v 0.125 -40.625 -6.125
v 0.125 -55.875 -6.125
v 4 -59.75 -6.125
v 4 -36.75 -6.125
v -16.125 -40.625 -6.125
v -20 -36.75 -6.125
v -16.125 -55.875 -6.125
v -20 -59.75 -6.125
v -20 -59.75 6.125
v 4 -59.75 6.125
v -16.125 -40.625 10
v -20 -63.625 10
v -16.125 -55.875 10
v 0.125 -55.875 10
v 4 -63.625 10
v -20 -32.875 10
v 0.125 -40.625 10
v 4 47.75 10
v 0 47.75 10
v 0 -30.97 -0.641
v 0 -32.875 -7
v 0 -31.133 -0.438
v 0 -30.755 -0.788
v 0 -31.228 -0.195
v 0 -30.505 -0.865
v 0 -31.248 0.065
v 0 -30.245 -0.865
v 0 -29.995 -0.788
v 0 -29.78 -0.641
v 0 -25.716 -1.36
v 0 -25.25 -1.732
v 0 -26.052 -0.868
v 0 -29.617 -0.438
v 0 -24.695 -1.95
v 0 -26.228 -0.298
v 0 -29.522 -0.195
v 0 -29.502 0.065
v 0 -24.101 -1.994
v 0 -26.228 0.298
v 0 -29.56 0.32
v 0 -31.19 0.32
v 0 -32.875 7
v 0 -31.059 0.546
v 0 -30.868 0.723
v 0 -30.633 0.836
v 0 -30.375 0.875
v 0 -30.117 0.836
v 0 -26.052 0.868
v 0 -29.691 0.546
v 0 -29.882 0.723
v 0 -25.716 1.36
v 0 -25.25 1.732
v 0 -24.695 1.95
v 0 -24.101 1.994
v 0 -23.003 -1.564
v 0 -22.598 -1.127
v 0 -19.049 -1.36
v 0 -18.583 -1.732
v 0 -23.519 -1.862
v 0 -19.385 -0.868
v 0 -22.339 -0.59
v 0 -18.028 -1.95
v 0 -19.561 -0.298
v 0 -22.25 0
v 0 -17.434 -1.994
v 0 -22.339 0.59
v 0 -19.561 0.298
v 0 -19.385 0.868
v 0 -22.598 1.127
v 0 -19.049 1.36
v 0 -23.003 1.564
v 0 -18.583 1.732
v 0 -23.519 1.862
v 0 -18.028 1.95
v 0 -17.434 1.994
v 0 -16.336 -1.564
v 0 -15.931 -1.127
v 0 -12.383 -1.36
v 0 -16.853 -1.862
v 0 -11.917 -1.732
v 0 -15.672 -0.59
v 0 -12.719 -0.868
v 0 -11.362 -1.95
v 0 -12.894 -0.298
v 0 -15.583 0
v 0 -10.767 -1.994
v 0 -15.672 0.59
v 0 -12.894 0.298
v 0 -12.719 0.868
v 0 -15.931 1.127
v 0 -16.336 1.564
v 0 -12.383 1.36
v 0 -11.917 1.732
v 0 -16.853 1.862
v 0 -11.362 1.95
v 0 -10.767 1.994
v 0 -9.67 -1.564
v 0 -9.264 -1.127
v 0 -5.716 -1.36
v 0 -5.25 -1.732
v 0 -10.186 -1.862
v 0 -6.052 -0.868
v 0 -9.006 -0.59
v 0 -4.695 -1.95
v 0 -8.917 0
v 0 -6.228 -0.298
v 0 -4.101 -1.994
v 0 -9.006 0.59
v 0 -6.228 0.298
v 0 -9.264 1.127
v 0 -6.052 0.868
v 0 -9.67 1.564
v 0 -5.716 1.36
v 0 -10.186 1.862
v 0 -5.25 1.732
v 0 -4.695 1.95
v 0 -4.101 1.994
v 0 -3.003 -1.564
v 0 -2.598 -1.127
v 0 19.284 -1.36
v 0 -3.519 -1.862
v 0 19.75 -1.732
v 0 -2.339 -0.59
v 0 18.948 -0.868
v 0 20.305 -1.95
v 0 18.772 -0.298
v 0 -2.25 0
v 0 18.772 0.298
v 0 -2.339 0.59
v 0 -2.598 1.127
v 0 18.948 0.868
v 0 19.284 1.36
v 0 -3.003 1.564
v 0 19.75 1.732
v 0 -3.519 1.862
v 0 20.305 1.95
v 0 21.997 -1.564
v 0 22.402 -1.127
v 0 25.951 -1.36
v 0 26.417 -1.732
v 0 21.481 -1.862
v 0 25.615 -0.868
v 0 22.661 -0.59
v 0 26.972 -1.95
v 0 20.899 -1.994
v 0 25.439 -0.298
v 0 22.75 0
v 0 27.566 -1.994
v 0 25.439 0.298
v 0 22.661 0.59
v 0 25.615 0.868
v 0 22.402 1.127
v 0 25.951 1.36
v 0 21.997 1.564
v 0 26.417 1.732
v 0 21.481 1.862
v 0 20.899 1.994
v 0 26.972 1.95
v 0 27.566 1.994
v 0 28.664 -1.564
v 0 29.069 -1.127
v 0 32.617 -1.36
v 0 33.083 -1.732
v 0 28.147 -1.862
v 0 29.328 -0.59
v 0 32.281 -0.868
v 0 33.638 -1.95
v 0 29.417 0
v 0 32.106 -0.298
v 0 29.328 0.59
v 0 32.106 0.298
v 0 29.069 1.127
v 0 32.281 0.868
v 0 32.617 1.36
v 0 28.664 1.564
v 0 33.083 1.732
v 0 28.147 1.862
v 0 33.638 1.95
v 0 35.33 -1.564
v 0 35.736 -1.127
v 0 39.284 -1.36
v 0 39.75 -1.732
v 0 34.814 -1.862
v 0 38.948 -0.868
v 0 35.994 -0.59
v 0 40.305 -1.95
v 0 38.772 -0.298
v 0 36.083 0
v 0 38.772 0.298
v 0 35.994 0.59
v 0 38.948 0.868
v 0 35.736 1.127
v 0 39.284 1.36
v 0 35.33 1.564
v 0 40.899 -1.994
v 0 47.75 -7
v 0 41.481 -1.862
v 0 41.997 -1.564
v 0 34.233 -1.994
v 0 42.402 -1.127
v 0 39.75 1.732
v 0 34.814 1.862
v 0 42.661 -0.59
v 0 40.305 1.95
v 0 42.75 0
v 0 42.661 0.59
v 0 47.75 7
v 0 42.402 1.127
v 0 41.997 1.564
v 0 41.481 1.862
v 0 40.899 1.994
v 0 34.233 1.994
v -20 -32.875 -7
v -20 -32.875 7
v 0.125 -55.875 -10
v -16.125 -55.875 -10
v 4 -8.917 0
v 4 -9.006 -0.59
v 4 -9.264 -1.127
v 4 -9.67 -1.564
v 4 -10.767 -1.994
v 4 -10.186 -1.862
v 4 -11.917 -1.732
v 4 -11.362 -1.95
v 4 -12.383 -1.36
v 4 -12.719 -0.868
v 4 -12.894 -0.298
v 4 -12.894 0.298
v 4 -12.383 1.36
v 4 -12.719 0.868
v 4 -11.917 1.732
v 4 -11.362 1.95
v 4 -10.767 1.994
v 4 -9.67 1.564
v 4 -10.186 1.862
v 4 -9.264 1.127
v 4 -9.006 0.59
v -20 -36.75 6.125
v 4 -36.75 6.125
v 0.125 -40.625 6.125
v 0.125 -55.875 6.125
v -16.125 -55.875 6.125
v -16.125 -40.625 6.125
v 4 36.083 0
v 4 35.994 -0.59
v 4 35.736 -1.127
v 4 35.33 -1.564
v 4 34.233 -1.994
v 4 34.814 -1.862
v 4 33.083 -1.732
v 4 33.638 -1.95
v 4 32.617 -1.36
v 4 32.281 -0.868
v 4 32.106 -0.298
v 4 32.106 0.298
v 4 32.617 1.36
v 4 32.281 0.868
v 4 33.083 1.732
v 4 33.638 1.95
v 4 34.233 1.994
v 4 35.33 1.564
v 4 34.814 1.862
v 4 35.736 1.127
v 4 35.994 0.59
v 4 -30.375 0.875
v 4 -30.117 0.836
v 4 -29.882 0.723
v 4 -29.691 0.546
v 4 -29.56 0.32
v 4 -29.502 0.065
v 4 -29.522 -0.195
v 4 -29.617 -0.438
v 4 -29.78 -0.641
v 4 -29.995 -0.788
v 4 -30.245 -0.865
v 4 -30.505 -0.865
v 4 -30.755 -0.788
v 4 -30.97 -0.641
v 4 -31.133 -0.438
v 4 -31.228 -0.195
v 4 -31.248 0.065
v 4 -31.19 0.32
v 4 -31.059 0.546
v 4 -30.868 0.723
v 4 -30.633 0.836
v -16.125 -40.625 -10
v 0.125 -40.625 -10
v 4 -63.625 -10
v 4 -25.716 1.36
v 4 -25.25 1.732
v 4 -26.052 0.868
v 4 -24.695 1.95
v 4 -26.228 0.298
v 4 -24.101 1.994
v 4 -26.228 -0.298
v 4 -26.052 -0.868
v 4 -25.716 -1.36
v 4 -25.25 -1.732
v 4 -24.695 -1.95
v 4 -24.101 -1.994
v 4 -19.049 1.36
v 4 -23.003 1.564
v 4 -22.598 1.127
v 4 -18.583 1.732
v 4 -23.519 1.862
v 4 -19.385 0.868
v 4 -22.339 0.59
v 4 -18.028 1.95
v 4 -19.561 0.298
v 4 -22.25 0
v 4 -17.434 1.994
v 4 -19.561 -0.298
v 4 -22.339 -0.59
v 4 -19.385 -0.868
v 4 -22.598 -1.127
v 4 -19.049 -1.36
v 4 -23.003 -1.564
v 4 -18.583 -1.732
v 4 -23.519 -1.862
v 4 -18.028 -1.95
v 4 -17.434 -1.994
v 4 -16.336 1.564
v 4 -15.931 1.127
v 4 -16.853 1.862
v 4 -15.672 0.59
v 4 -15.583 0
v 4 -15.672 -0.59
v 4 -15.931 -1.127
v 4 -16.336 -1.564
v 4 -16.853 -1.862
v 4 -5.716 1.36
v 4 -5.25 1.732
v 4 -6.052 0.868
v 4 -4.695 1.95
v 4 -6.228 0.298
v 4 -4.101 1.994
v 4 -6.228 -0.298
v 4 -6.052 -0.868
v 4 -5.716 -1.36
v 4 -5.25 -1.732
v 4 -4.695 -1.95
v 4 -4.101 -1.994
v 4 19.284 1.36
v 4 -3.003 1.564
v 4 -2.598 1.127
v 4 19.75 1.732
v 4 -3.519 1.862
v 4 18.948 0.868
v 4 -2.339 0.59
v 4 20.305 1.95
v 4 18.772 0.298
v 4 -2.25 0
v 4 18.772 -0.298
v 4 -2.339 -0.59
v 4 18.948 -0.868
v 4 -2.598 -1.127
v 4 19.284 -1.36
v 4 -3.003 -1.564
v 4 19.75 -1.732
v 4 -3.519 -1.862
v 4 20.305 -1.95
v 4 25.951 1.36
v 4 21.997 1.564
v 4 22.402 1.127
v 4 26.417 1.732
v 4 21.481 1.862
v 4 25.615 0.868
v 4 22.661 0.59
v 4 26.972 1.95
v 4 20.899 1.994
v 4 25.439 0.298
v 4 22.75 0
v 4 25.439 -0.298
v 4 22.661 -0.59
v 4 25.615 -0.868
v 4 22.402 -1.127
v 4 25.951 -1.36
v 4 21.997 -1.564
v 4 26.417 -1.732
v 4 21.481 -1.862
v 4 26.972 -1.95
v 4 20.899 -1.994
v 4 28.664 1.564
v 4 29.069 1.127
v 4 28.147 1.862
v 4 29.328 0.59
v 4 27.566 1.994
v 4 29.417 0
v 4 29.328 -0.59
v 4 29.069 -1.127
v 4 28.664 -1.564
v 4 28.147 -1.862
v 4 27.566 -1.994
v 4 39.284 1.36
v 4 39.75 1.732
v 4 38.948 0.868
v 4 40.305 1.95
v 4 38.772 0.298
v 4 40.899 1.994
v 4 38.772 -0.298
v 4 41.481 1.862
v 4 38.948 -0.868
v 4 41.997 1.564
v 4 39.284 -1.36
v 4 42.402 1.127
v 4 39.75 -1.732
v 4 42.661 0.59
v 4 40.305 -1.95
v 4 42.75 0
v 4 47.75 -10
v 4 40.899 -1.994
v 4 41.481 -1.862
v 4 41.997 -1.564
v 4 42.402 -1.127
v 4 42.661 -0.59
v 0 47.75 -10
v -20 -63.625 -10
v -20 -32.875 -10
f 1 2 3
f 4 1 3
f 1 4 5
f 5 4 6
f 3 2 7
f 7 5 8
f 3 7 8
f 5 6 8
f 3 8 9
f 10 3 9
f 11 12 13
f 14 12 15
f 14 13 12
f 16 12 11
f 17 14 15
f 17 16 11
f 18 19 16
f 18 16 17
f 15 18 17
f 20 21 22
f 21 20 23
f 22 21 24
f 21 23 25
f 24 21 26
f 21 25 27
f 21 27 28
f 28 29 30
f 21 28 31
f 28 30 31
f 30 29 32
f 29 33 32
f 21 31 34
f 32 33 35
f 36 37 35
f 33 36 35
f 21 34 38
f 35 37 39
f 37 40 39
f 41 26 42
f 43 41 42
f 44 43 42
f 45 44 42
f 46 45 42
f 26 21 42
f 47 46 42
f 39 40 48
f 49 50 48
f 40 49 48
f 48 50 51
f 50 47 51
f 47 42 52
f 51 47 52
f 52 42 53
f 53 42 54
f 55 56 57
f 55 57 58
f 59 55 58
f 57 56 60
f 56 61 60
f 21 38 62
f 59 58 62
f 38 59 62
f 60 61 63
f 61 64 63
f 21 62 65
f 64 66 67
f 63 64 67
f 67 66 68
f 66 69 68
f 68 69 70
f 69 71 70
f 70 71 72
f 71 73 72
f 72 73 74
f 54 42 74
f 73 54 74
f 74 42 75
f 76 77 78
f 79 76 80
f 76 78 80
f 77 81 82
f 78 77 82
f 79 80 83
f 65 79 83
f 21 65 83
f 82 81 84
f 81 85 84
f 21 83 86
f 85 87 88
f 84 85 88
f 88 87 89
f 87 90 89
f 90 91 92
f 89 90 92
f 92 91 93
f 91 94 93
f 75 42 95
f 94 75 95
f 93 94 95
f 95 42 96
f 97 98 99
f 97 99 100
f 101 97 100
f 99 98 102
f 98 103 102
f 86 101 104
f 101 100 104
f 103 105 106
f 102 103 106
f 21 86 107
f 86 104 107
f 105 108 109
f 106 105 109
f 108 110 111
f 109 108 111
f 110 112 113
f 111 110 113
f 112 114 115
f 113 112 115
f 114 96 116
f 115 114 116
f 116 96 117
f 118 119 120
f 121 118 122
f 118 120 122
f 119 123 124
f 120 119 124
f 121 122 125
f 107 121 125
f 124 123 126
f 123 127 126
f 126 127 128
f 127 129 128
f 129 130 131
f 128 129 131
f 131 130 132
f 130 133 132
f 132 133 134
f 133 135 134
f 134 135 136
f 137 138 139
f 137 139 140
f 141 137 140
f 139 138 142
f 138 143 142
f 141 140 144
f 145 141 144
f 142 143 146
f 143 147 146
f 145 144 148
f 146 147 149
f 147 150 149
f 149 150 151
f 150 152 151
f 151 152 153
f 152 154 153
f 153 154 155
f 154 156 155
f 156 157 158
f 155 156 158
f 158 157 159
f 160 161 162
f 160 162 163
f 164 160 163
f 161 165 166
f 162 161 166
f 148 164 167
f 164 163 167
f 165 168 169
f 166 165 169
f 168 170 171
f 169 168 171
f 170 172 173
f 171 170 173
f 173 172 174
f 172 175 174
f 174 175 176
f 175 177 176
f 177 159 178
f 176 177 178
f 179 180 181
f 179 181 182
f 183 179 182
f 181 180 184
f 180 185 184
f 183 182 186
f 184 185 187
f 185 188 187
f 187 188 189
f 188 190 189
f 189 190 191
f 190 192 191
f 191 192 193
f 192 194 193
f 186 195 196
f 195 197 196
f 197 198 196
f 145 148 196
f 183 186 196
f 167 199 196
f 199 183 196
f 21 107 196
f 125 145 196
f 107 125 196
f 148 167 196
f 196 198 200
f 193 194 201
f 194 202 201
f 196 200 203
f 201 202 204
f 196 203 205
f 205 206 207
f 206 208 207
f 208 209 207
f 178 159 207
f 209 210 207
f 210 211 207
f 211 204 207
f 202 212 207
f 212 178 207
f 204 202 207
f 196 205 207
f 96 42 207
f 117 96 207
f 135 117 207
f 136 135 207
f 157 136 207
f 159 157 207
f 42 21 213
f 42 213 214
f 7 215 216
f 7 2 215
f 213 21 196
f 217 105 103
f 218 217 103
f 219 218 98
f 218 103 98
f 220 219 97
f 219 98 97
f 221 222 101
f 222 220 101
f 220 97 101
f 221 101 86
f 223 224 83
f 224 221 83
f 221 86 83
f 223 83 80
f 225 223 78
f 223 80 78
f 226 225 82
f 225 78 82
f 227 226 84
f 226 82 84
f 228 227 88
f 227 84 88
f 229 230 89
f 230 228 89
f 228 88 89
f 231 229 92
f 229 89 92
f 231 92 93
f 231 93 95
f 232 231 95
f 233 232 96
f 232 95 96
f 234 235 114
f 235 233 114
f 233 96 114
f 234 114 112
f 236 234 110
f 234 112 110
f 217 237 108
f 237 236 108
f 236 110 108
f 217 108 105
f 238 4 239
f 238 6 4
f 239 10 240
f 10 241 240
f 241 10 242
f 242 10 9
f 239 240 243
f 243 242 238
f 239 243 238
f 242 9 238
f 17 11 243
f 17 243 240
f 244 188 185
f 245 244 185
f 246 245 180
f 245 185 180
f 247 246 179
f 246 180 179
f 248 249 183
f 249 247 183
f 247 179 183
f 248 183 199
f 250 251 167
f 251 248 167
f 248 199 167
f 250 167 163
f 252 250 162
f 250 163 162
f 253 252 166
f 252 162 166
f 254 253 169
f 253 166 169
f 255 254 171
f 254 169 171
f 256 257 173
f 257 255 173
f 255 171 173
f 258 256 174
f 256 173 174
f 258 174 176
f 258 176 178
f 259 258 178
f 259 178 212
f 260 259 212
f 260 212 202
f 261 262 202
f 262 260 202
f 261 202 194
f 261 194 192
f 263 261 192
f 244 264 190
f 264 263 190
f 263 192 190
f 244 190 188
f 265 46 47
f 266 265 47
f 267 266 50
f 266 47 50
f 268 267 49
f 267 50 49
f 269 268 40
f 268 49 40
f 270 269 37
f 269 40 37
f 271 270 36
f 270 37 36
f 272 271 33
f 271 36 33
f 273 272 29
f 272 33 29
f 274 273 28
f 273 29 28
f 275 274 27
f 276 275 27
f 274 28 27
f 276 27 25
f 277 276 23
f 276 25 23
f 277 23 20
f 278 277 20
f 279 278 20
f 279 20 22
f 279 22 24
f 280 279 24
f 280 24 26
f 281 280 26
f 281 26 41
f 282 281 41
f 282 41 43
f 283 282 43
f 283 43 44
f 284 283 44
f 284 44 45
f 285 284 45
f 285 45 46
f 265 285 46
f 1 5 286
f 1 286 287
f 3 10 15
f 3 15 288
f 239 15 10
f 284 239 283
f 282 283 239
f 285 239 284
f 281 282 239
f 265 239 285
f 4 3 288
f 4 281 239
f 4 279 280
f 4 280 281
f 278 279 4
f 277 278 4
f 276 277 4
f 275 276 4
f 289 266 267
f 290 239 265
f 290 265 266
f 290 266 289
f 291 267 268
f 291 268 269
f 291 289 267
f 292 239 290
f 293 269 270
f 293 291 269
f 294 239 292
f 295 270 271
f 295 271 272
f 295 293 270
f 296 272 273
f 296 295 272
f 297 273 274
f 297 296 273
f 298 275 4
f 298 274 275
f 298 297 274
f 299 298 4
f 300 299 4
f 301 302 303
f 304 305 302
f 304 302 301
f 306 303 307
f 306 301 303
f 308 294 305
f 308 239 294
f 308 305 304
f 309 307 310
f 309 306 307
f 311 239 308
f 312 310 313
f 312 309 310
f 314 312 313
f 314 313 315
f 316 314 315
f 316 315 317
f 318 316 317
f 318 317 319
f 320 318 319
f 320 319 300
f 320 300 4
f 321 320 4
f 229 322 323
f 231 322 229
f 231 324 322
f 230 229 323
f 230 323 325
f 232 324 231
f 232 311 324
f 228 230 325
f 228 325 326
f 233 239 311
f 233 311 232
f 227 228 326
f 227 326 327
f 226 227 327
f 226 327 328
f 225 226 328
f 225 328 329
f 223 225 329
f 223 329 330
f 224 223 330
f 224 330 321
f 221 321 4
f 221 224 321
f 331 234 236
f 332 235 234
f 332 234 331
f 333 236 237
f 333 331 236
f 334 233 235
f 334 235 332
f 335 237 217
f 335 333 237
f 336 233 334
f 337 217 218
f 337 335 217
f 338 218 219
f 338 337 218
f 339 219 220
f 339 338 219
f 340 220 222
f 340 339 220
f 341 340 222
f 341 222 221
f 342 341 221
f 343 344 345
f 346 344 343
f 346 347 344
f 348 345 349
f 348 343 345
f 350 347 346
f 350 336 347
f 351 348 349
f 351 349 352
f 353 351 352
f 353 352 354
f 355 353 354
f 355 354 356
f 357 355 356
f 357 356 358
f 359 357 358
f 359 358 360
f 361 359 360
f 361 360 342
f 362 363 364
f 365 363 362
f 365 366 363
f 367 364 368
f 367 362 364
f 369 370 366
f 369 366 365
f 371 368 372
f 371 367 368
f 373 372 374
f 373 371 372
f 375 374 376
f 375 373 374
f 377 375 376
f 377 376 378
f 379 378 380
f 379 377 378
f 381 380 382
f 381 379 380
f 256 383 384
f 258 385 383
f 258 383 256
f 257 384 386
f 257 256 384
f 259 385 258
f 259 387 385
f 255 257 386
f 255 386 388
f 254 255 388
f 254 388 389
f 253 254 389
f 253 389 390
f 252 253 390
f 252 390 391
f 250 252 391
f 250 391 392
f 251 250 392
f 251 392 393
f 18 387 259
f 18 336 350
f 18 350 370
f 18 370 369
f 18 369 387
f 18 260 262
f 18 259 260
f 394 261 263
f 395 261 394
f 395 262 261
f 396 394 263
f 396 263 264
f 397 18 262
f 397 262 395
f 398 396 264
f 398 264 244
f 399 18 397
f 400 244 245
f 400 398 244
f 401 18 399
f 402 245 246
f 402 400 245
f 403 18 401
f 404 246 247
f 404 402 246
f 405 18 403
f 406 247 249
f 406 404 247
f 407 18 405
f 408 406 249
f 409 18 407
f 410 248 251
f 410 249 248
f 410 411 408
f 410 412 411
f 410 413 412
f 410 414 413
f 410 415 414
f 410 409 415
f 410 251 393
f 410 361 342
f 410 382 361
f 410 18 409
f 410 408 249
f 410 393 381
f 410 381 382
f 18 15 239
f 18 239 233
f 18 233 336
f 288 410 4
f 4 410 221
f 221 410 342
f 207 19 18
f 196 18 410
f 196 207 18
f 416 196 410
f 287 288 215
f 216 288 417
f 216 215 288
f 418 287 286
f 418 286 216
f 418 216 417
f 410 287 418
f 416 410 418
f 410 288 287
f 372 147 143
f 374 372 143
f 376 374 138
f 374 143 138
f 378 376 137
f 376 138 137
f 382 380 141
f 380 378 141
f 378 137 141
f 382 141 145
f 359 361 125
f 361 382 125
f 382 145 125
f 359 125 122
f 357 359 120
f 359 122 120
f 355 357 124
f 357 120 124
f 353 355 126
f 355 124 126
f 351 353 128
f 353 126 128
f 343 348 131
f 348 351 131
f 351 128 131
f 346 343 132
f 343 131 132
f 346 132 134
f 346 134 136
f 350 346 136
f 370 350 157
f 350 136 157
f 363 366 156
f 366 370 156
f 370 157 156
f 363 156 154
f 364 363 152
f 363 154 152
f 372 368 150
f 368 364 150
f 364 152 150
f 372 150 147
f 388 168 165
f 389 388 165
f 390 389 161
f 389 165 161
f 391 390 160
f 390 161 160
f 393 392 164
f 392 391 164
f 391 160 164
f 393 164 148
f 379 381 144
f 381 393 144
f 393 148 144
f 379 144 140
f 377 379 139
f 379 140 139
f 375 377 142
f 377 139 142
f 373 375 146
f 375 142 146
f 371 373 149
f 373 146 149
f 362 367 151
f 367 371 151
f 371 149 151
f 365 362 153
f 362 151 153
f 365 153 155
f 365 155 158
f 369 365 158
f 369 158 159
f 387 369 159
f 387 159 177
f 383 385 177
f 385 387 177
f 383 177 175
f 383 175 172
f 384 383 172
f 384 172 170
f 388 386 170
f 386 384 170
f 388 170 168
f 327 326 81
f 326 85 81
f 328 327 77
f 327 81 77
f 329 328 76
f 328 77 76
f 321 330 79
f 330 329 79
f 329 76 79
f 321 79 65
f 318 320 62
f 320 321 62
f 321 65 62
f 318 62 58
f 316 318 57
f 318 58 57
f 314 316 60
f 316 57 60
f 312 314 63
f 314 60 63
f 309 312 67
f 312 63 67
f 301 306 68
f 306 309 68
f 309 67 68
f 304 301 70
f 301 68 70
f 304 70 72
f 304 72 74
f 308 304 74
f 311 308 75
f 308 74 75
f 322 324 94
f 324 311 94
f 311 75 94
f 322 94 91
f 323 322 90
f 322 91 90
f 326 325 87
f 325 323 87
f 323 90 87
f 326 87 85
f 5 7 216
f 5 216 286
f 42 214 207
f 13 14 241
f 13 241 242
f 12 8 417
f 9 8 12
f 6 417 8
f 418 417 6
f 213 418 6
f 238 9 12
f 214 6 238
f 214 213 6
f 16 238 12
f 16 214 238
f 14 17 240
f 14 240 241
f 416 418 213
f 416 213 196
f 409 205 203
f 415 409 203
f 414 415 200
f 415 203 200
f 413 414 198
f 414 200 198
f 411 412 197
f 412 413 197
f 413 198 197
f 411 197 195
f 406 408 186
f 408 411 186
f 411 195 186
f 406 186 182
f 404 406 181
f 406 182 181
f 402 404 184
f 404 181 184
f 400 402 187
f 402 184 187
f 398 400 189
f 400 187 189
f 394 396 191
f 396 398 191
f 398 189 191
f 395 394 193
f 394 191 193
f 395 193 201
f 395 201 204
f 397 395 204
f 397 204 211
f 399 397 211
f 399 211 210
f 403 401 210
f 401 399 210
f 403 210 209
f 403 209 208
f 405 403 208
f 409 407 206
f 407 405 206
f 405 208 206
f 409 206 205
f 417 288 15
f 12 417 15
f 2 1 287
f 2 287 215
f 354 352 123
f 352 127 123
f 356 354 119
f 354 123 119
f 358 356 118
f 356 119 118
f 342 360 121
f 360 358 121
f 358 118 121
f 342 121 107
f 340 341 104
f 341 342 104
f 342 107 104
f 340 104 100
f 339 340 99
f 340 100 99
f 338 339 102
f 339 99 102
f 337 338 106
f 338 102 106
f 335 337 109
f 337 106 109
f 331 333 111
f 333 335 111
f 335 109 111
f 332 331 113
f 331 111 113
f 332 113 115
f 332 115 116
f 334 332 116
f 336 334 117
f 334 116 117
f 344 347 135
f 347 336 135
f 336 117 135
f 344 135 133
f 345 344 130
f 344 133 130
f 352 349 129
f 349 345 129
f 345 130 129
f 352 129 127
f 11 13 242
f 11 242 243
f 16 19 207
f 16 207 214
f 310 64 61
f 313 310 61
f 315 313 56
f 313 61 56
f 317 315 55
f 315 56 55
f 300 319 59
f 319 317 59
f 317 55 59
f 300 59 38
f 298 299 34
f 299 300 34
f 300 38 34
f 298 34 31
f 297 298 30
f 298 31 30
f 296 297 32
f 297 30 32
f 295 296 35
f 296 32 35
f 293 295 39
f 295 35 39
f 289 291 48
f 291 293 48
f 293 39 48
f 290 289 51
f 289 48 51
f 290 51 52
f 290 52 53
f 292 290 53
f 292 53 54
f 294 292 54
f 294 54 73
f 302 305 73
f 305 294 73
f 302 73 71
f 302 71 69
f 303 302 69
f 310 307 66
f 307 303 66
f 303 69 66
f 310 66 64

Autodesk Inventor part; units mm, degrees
ref_plane "YZ Plane" through (0, 0, 0) normal (1, 0, 0) x (0, 1, 0)
ref_plane "XZ Plane" through (0, 0, 0) normal (0, 1, 0) x (-1, 0, 0)
ref_plane "XY Plane" through (0, 0, 0) normal (0, 0, 1) x (1, 0, 0)
sketch "Sketch1" plane through (0, 0, 0) normal (1, 0, 0) x (0, 1, 0)
  line L0 (47.75, -10) -> (-47.75, -10)
  line L1 (-47.75, -10) -> (-47.75, 10)
  line L2 (-47.75, 10) -> (47.75, 10)
  line L3 (47.75, 10) -> (47.75, -10)
  line L4 (47.75, -10) -> (-47.75, 10) construction
  line L5 (-47.75, -10) -> (47.75, 10) construction
  circle A0 centre (40.75, 0) radius 2
  circle A1 centre (-4.25, 0) radius 2
  line L6 (18.25, 25.1028) -> (18.25, -34.7635) construction
  line L7 (-1.75, 23.8417) -> (-1.75, -36.7999) construction
  circle A2 centre (20.75, 0) radius 2
  circle A3 centre (-24.25, 0) radius 2
  line L8 (-41.75, 23.8417) -> (-41.75, -30.9921) construction
  circle A4 centre (34.0833, 0) radius 2
  circle A5 centre (27.4167, 0) radius 2
  circle A6 centre (-10.9167, 0) radius 2
  circle A7 centre (-17.5833, 0) radius 2
  point P0 (0, 0)
  dimension "d1" = 20
  dimension "d4" = 4
  dimension "d5" = 7
  dimension "d6" = 45
  dimension "d7" = 22.5
  dimension "d8" = 20
  dimension "d9" = 22.5
  dimension "d10" = 22.5
  dimension "d11" = 60
  dimension "d18" = 6.6667
  dimension "d25" = 6.6667
  dimension "d30" = 6
extrude "Extrusion1" add sketch "Sketch1" along normal blind 4
sketch "Sketch2" plane through (0, 0, 0) normal (1, 0, 0) x (0, 1, 0)
  line L0 (-41.75, 22.3574) -> (-41.75, -36.9148) construction
  circle A0 centre (-17.5833, 0) radius 2 projected
  circle A1 centre (-10.9167, 0) radius 2 projected
  circle A2 centre (27.4167, 0) radius 2 projected
  circle A3 centre (34.0833, 0) radius 2 projected
  circle A4 centre (-24.25, 0) radius 2 projected
  circle A5 centre (20.75, 0) radius 2 projected
  circle A6 centre (-4.25, 0) radius 2 projected
  circle A7 centre (40.75, 0) radius 2 projected
  line L1 (-47.75, -10) -> (47.75, -10) projected
  line L2 (47.75, -10) -> (47.75, 10) projected
  line L3 (47.75, 10) -> (-47.75, 10) projected
  line L4 (-47.75, 10) -> (-47.75, -10) projected
  line L5 (47.75, 0) -> (-47.75, 0) construction
  line L6 (-47.75, -10) -> (-47.75, 10) projected
  line L7 (-59.75, -6.125) -> (-36.75, -6.125)
  line L8 (-36.75, -6.125) -> (-36.75, 6.125)
  line L9 (-36.75, 6.125) -> (-59.75, 6.125)
  line L10 (-59.75, 6.125) -> (-59.75, -6.125)
  line L11 (-59.75, -6.125) -> (-36.75, 6.125) construction
  line L12 (-36.75, -6.125) -> (-59.75, 6.125) construction
  line L13 (-47.75, -10) -> (-63.625, -10)
  line L14 (-63.625, -10) -> (-63.625, 10)
  line L15 (-63.625, 10) -> (-47.75, 10)
  line L16 (-47.75, 10) -> (-47.75, -10)
  line L17 (-32.875, -10) -> (-32.875, 10)
  point P0 (0, 0)
  point P1 (-48.25, 0)
  dimension "d33" = 6
  dimension "d34" = 12.25
  dimension "d35" = 23
  dimension "d36" = 5
  dimension "d37" = 3.875
  dimension "d38" = 3.875
  dimension "d39" = 3.875
extrude "Extrusion2" cut sketch "Sketch2" along normal blind 20 contours L7 L10 L9 L4 | L4 L9 L8 L7
sketch "Sketch3" plane through (0, 0, 0) normal (-1, 0, 0) x (0, 0, 1)
  line L0 (-10, -47.75) -> (-6.125, -47.75) projected
  line L1 (-10, -47.75) -> (-6.125, -47.75)
  line L2 (6.125, -47.75) -> (10, -47.75) projected
  line L3 (10, -47.75) -> (6.125, -47.75)
  line L4 (6.125, -36.75) -> (6.125, -47.75) projected
  line L5 (6.125, -47.75) -> (10, -47.75) projected
  line L6 (10, -47.75) -> (10, 47.75) projected
  line L7 (10, 47.75) -> (-10, 47.75) projected
  line L8 (-10, 47.75) -> (-10, -47.75) projected
  line L9 (-10, -47.75) -> (-6.125, -47.75) projected
  line L10 (-6.125, -47.75) -> (-6.125, -36.75) projected
  line L11 (-6.125, -36.75) -> (6.125, -36.75) projected
  circle A0 centre (0, -17.5833) radius 2 projected
  circle A1 centre (0, -10.9167) radius 2 projected
  circle A2 centre (0, 27.4167) radius 2 projected
  circle A3 centre (0, 34.0833) radius 2 projected
  circle A4 centre (0, -24.25) radius 2 projected
  circle A5 centre (0, 20.75) radius 2 projected
  circle A6 centre (0, -4.25) radius 2 projected
  circle A7 centre (0, 40.75) radius 2 projected
  line L12 (-6.125, -36.75) -> (6.125, -36.75)
  line L13 (6.125, -36.75) -> (6.125, -59.75)
  line L14 (6.125, -59.75) -> (-6.125, -59.75)
  line L15 (-6.125, -59.75) -> (-6.125, -36.75)
  line L16 (-10, 47.75) -> (-10, -47.75) projected
  line L17 (-10, -32.875) -> (10, -32.875)
  line L18 (10, -32.875) -> (10, -63.625)
  line L19 (10, -63.625) -> (-10, -63.625)
  line L20 (-10, -63.625) -> (-10, -32.875)
  point P0 (0, 0)
  dimension "d44" = 23
  dimension "d45" = 3.875
  dimension "d46" = 3.875
  dimension "d47" = 3.875
extrude "Extrusion4" add sketch "Sketch3" along normal blind 20 contours L8 L17 L6 L2 L4 L11 L10 L0 | L0 L15 L14 L13 L2 L18 L19 L20
sketch "Sketch5" plane through (0, 0, 0) normal (1, 0, 0) x (0, 0, -1)
  line L0 (-6.125, -47.75) -> (-10, -47.75) projected
  line L1 (-10, -63.625) -> (-10, -47.75) projected
  line L2 (10, -63.625) -> (-10, -63.625) projected
  line L3 (10, -47.75) -> (10, -63.625) projected
  line L4 (10, -47.75) -> (6.125, -47.75) projected
  line L5 (6.125, -47.75) -> (6.125, -59.75) projected
  line L6 (6.125, -59.75) -> (-6.125, -59.75) projected
  line L7 (-6.125, -59.75) -> (-6.125, -47.75) projected
  point P0 (0, 0)
extrude "Extrusion5" add sketch "Sketch5" along normal blind 4
sketch "Sketch6" plane through (0, 0, 0) normal (-1, 0, 0) x (0, 0, 1)
  line L0 (-10, -32.875) -> (10, -32.875) projected
  line L1 (10, -32.875) -> (10, 47.75) projected
  line L2 (10, 47.75) -> (-10, 47.75) projected
  line L3 (-10, 47.75) -> (-10, -32.875) projected
  circle A0 centre (0, -17.5833) radius 2 projected
  circle A1 centre (0, -10.9167) radius 2 projected
  circle A2 centre (0, 27.4167) radius 2 projected
  circle A3 centre (0, 34.0833) radius 2 projected
  circle A4 centre (0, -24.25) radius 2 projected
  circle A5 centre (0, 20.75) radius 2 projected
  circle A6 centre (0, -4.25) radius 2 projected
  circle A7 centre (0, 40.75) radius 2 projected
  circle A8 centre (0, -30.375) radius 0.875
  point P0 (0, 0)
  dimension "d52" = 2.5
  dimension "d53" = 1.75
extrude "Extrusion6" cut sketch "Sketch6" against normal blind 4 contours A8
sketch "Sketch7" plane through (0, 47.75, 10) normal (0, 0, 1) x (1, 0, 0)
  line L0 (4, 0) -> (4, -111.375) projected
  line L1 (0, 0) -> (4, 0) projected
  line L2 (0, -80.625) -> (0, 0) projected
  line L3 (0, -80.625) -> (-20, -80.625) projected
  line L4 (-20, -111.375) -> (-20, -80.625) projected
  line L5 (4, -111.375) -> (-20, -111.375) projected
  line L6 (4, -84.5) -> (4, -107.5) projected
  line L7 (-20, -84.5) -> (4, -84.5) projected
  line L8 (-20, -107.5) -> (-20, -84.5) projected
  line L9 (4, -107.5) -> (-20, -107.5) projected
  line L10 (-16.125, -88.375) -> (0.125, -88.375)
  line L11 (0.125, -88.375) -> (0.125, -103.625)
  line L12 (0.125, -103.625) -> (-16.125, -103.625)
  line L13 (-16.125, -103.625) -> (-16.125, -88.375)
  point P0 (0, -47.75)
  dimension "d56" = 3.875
  dimension "d57" = 3.875
  dimension "d58" = 3.875
  dimension "d59" = 3.875
extrude "Extrusion7" cut sketch "Sketch7" against normal blind 20 contours L10 L11 L12 L13
sketch "Sketch8" plane through (4, 47.75, -10) normal (0, 0, -1) x (-1, 0, 0)
  line L0 (24, -84.5) -> (0, -84.5) projected
  line L1 (20.125, -88.375) -> (20.125, -103.625) projected
  line L2 (20.125, -103.625) -> (3.875, -103.625) projected
  line L3 (3.875, -103.625) -> (3.875, -88.375) projected
  line L4 (3.875, -88.375) -> (20.125, -88.375) projected
  line L5 (4, 0) -> (4, -80.625) projected
  line L6 (4, 0) -> (0, 0) projected
  line L7 (0, -111.375) -> (0, 0) projected
  line L8 (0, -111.375) -> (24, -111.375) projected
  line L9 (24, -80.625) -> (24, -111.375) projected
  line L10 (4, -80.625) -> (24, -80.625) projected
  line L11 (4, -80.625) -> (4, 0) projected
  line L12 (4, 0) -> (4, -80.625) projected
  line L13 (24, -80.625) -> (4, 0)
  point P0 (4, -47.75)
extrude "Extrusion8" add sketch "Sketch8" against normal blind 3 contours L10 L5 L13
mirror "Mirror2" about plane through (0, 0, 0) normal (0, 0, 1) of "Extrusion8"
sketch "Sketch9" plane through (4, 0, 0) normal (1, 0, 0) x (0, 0, -1)
  circle A0 centre (0, -30.375) radius 0.875 projected
  line L0 (10, -63.625) -> (10, 47.75) projected
  line L1 (10, 47.75) -> (-10, 47.75) projected
  line L2 (-10, 47.75) -> (-10, -63.625) projected
  line L3 (-10, -63.625) -> (10, -63.625) projected
  line L4 (6.125, -36.75) -> (6.125, -59.75) projected
  line L5 (6.125, -59.75) -> (-6.125, -59.75) projected
  line L6 (-6.125, -59.75) -> (-6.125, -36.75) projected
  line L7 (-6.125, -36.75) -> (6.125, -36.75) projected
  circle A1 centre (0, 40.75) radius 2 projected
  circle A2 centre (0, -4.25) radius 2 projected
  circle A3 centre (0, 20.75) radius 2 projected
  circle A4 centre (0, -24.25) radius 2 projected
  circle A5 centre (0, 34.0833) radius 2 projected
  circle A6 centre (0, 27.4167) radius 2 projected
  circle A7 centre (0, -10.9167) radius 2 projected
  circle A8 centre (0, -17.5833) radius 2 projected
  point P0 (0, 0)
properties part number "TopRearLeg"
